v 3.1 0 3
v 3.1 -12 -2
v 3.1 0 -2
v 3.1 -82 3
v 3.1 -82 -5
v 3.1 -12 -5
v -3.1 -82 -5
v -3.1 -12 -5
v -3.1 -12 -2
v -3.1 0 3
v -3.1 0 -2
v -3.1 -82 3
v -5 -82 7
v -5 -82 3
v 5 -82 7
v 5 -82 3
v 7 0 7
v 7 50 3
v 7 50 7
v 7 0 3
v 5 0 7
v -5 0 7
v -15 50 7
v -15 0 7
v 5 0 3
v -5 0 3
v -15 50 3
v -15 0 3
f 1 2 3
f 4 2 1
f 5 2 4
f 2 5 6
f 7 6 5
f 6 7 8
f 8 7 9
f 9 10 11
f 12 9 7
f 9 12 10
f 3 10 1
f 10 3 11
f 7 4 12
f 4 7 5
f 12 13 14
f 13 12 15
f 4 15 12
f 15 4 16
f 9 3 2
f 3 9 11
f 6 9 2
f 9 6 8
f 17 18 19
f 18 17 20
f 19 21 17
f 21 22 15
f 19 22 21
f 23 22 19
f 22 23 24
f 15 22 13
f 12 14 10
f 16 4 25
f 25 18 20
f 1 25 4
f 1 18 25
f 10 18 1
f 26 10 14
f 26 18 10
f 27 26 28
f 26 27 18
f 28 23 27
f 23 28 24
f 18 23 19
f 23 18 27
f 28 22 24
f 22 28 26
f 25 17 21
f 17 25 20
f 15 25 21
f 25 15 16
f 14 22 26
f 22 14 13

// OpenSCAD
wOnlyLen = 50;
bLen = 82;
insetZ = 10;
insetX = 6.2;
bX = 10;
wX = 22;
wH = 4;

module keycapCF(){
difference(){
    translate([0,-bLen/2,0]) cube([insetX,bLen,insetZ],center=true);
    translate([-6,-12,-14]) cube([12,wOnlyLen,12]);
}
    //Key cap end:
    translate([0-2-2,25-bLen/2+bLen/2,5]) cube([wX,wOnlyLen,wH],center=true);
    //Sharp-side key cap
    //translate([-bX/2,-bLen,5]) cube([bX,wOnlyLen+bLen,wH],center=false);
//translate([1+1*bX/2-wX/2,-bLen,3]) cube([bX/2+wX/2-2,wOnlyLen+bLen,wH],center=false);
translate([-bX/2,-bLen,3]) cube([bX,wOnlyLen+bLen,wH],center=false);
//46-50 mm long
}

//customGrid(100,5);

// Example of a custom grid structure
module customGrid(size, spacing) {
    for (i = [-size : spacing : size]) {
        color("lime") translate([i, -size, 0]) cube([1, 2*size, 1]); // Adjust as needed
        color("lime") translate([-size, i, 0]) cube([2*size, 1, 1]); // Adjust as needed
    }
}

keycapCF();
